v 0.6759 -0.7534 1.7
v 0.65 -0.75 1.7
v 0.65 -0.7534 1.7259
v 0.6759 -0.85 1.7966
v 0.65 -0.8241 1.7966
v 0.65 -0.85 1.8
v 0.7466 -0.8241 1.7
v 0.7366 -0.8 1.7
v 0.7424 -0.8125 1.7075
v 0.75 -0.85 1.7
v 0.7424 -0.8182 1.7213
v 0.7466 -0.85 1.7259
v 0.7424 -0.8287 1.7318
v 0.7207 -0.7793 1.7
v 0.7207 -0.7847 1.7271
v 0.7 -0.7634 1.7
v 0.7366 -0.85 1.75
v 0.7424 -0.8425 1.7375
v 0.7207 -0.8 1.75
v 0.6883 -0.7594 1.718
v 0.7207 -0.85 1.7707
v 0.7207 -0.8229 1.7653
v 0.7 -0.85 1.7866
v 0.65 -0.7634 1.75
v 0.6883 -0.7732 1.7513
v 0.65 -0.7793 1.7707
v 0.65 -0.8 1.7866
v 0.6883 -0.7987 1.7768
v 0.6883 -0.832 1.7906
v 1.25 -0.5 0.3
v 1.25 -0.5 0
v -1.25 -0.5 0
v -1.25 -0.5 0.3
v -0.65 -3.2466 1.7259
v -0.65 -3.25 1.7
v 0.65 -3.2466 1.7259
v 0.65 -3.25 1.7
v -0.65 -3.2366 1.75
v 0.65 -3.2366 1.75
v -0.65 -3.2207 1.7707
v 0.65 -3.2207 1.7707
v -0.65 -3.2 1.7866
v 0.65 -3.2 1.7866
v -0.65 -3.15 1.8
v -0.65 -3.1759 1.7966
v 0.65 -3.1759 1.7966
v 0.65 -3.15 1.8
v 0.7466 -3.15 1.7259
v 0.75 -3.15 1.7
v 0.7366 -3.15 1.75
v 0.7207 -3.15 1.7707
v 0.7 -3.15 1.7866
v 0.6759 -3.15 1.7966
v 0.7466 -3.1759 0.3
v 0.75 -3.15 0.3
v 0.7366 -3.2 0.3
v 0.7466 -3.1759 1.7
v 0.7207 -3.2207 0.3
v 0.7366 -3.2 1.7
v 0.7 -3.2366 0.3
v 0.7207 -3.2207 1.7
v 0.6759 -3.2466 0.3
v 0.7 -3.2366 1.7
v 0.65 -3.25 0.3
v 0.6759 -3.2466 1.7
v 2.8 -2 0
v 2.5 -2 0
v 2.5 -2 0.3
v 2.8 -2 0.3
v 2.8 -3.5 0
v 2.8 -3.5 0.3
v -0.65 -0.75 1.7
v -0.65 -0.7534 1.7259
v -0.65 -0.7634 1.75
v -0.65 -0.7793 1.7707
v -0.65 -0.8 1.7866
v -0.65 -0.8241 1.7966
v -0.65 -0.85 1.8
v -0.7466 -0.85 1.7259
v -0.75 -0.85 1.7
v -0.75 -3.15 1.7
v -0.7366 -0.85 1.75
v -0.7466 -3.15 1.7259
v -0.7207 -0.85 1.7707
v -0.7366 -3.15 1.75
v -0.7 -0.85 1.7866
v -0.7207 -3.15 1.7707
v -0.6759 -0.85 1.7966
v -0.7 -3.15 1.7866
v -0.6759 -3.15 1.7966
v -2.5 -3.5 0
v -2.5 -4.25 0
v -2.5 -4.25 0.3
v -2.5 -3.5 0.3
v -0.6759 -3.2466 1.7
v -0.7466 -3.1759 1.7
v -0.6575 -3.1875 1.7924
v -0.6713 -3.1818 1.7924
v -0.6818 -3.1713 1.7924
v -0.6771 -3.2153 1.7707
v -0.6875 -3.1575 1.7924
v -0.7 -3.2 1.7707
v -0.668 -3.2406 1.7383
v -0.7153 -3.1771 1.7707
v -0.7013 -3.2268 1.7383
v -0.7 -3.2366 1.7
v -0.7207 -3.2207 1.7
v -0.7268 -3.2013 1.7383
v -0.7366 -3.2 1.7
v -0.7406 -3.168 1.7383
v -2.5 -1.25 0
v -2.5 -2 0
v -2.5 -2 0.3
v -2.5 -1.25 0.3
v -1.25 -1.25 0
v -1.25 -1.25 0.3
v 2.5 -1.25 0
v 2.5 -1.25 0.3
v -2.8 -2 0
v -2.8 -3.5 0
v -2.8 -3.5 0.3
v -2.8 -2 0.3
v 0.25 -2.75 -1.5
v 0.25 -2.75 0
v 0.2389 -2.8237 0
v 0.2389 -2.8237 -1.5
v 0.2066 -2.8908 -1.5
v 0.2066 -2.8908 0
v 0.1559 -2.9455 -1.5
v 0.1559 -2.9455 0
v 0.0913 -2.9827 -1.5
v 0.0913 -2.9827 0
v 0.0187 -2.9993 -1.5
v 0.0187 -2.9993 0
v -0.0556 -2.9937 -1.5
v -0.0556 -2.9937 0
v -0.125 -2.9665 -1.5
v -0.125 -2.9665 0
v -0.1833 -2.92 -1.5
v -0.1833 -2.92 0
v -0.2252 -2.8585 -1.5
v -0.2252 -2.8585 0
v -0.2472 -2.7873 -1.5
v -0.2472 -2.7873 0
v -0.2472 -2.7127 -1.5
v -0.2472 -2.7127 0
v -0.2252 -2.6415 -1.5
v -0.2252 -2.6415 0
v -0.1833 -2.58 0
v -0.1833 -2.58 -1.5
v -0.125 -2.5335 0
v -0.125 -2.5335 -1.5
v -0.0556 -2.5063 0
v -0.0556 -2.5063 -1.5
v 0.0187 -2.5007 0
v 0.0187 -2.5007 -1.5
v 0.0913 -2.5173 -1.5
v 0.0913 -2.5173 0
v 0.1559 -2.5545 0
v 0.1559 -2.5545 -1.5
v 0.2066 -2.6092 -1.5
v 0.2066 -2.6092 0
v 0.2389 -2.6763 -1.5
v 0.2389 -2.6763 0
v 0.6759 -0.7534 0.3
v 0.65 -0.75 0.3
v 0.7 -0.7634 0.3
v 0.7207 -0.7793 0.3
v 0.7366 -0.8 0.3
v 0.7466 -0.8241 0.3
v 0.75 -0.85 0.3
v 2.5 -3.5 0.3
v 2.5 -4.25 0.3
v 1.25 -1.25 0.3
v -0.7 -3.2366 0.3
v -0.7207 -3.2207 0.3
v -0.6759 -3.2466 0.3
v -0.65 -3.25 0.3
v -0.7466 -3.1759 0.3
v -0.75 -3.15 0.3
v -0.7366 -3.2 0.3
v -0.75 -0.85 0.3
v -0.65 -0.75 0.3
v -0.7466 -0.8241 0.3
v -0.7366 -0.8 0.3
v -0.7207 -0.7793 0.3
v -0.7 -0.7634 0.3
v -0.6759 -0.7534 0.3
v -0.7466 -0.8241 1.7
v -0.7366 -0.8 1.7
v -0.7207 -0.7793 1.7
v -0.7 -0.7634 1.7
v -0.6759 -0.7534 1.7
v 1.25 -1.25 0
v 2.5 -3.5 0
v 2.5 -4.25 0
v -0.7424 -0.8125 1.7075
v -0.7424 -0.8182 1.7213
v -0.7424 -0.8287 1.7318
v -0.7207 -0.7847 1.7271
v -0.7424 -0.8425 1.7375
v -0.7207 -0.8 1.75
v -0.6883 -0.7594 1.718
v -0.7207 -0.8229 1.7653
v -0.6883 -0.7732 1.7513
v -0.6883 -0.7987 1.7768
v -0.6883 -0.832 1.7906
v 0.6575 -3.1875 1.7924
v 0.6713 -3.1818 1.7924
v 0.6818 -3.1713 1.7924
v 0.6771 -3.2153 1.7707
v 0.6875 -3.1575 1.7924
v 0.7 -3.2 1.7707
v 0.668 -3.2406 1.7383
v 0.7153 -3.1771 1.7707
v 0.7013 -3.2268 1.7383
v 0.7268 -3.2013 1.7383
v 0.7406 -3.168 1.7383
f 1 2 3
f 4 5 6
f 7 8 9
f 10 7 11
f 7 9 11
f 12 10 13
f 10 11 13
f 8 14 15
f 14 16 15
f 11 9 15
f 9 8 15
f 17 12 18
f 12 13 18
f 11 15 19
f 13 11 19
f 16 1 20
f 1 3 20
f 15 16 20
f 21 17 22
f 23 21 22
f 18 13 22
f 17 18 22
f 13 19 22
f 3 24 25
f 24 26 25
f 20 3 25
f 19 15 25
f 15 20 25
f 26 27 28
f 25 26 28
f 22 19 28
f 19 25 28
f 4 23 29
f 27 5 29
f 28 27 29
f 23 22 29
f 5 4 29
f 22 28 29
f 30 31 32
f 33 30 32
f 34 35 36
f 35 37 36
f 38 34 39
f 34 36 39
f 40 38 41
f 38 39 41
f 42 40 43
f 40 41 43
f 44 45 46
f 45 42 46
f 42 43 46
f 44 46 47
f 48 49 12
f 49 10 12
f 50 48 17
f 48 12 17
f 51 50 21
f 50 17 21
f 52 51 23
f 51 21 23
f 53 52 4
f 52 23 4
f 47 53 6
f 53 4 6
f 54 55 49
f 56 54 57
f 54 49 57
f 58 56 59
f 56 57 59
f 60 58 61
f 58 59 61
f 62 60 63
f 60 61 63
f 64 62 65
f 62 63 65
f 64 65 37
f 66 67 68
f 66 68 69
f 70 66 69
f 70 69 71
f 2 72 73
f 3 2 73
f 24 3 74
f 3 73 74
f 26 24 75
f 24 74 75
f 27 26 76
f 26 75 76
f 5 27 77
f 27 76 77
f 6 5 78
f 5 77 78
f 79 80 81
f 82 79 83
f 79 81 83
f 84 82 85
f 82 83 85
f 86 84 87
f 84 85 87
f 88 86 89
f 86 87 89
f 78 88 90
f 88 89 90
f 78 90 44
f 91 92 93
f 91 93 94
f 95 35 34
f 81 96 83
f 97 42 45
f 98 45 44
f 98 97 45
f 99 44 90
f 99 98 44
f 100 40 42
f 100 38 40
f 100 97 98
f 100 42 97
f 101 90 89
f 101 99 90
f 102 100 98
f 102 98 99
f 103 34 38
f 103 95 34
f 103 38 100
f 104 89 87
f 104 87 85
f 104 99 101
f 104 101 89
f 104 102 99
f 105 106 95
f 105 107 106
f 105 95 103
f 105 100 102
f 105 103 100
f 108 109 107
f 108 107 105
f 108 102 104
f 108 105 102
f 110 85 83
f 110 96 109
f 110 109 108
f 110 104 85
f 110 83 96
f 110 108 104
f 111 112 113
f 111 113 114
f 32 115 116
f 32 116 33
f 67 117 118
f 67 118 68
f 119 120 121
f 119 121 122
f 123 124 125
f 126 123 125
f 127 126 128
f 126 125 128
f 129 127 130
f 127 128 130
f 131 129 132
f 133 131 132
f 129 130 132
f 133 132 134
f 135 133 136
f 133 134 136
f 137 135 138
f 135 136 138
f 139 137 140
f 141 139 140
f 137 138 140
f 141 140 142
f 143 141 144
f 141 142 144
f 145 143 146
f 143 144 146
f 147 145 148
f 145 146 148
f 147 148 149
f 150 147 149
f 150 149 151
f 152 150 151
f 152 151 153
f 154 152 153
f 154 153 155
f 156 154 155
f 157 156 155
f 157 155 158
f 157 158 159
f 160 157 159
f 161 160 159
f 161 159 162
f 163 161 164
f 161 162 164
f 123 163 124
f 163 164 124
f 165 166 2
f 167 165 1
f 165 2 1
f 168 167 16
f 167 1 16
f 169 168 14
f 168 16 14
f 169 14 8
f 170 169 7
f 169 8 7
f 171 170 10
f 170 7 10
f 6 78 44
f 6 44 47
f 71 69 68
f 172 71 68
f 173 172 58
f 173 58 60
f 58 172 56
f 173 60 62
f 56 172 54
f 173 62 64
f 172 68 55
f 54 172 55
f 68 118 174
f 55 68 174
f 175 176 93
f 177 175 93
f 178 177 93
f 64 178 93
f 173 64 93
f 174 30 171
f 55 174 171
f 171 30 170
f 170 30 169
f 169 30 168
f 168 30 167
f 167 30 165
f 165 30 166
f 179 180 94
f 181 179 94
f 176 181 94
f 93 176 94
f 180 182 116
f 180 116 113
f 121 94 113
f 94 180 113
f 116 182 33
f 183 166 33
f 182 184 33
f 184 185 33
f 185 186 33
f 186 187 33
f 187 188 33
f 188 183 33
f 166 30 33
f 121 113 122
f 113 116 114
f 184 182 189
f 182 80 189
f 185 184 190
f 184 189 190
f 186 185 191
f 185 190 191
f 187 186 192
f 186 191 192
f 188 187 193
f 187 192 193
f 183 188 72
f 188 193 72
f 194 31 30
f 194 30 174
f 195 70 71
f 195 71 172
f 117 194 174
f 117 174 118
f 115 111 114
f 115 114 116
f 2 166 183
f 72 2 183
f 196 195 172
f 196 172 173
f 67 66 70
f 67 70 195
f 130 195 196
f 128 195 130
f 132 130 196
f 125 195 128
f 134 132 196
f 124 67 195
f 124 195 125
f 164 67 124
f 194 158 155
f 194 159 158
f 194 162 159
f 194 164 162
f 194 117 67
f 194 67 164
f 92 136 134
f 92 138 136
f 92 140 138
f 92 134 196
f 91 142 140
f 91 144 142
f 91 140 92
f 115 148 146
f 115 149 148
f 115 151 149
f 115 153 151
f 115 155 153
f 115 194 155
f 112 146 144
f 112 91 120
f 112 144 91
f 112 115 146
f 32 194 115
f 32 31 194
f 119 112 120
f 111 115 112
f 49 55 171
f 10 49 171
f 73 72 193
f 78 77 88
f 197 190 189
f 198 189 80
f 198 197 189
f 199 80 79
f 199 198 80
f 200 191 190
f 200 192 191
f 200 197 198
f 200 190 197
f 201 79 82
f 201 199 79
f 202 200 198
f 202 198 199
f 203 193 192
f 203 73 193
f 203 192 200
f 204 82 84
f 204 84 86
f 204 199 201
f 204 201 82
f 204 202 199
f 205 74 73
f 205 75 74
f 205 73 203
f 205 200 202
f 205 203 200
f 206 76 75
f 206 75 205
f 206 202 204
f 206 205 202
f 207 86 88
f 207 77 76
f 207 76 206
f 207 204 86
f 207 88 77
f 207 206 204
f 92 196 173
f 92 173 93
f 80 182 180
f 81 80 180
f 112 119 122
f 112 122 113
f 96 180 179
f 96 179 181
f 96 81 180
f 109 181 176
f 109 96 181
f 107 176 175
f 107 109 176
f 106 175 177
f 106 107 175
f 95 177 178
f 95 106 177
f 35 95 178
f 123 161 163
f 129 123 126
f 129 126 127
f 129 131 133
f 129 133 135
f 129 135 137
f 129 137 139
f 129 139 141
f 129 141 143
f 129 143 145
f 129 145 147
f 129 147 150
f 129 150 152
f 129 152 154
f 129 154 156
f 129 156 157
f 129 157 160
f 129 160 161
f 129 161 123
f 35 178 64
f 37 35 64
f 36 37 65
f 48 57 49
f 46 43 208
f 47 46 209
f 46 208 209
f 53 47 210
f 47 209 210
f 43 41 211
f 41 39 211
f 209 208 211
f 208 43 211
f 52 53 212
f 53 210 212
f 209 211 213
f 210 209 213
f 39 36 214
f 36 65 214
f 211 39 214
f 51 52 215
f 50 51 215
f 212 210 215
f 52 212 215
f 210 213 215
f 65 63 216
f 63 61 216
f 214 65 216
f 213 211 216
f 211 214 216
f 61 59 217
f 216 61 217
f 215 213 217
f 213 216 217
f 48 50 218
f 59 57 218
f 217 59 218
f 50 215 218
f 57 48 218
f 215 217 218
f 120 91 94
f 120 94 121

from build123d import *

# Parameters (mm, degrees)
BOSS_EXTRUDE1_DEPTH = 0.3
BOSS_EXTRUDE2_DEPTH = 1.5
FILLET1_R           = 0.1
SKETCH4_R           = 0.25
BOSS_EXTRUDE3_DEPTH = 1.5
SKETCH5_W           = 2.5
SKETCH5_H           = 0.5
CUT_EXTRUDE1_DEPTH  = 10


with BuildPart() as part:
    # Sketch2 → Boss-Extrude1 (new body)
    with BuildSketch(Plane.XY):
        Polygon((-1.25, 0), (1.25, 0), (1.25, -1.25), (2.5, -1.25), (2.5, -2), (2.8, -2), (2.8, -3.5), (2.5, -3.5), (2.5, -4.25), (-2.5, -4.25), (-2.5, -3.5), (-2.8, -3.5), (-2.8, -2), (-2.5, -2), (-2.5, -1.25), (-1.25, -1.25), align=None)
    extrude(amount=BOSS_EXTRUDE1_DEPTH)

    # Sketch3 → Boss-Extrude2 (add)
    with BuildSketch(Plane.XY.offset(0.3)):
        Polygon((-0.75, -3.25), (0.75, -3.25), (0.75, -0.75), (0, -0.75), (-0.75, -0.75), align=None)
    extrude(amount=BOSS_EXTRUDE2_DEPTH)

    # Fillet1
    fillet1_edges = [part.edges().sort_by_distance(p)[0] for p in [
        (-0.75, -3.25, 1.05),
        (0.75, -3.25, 1.05),
        (0, -0.75, 1.8),
        (0.75, -0.75, 1.05),
        (-0.75, -0.75, 1.05),
        (0, -3.25, 1.8),
        (0.75, -2, 1.8),
        (-0.75, -2, 1.8),
    ]]
    fillet(fillet1_edges, radius=FILLET1_R)

    # Sketch4 → Boss-Extrude3 (add)
    with BuildSketch(Plane(origin=(0, 0, 0), x_dir=(-1, 0, 0), z_dir=(0, 0, -1))):
        with Locations(Location((0, -2.75, 0), (0, 0, 180))):
            Circle(SKETCH4_R)
    extrude(amount=BOSS_EXTRUDE3_DEPTH)

    # Sketch5 → Cut-Extrude1 (cut)
    with BuildSketch(Plane(origin=(0, 0, 0), x_dir=(-1, 0, 0), z_dir=(0, 0, -1))):
        with Locations((0, -0.25)):
            Rectangle(SKETCH5_W, SKETCH5_H)
    extrude(amount=-CUT_EXTRUDE1_DEPTH, mode=Mode.SUBTRACT)


solid = part.part
